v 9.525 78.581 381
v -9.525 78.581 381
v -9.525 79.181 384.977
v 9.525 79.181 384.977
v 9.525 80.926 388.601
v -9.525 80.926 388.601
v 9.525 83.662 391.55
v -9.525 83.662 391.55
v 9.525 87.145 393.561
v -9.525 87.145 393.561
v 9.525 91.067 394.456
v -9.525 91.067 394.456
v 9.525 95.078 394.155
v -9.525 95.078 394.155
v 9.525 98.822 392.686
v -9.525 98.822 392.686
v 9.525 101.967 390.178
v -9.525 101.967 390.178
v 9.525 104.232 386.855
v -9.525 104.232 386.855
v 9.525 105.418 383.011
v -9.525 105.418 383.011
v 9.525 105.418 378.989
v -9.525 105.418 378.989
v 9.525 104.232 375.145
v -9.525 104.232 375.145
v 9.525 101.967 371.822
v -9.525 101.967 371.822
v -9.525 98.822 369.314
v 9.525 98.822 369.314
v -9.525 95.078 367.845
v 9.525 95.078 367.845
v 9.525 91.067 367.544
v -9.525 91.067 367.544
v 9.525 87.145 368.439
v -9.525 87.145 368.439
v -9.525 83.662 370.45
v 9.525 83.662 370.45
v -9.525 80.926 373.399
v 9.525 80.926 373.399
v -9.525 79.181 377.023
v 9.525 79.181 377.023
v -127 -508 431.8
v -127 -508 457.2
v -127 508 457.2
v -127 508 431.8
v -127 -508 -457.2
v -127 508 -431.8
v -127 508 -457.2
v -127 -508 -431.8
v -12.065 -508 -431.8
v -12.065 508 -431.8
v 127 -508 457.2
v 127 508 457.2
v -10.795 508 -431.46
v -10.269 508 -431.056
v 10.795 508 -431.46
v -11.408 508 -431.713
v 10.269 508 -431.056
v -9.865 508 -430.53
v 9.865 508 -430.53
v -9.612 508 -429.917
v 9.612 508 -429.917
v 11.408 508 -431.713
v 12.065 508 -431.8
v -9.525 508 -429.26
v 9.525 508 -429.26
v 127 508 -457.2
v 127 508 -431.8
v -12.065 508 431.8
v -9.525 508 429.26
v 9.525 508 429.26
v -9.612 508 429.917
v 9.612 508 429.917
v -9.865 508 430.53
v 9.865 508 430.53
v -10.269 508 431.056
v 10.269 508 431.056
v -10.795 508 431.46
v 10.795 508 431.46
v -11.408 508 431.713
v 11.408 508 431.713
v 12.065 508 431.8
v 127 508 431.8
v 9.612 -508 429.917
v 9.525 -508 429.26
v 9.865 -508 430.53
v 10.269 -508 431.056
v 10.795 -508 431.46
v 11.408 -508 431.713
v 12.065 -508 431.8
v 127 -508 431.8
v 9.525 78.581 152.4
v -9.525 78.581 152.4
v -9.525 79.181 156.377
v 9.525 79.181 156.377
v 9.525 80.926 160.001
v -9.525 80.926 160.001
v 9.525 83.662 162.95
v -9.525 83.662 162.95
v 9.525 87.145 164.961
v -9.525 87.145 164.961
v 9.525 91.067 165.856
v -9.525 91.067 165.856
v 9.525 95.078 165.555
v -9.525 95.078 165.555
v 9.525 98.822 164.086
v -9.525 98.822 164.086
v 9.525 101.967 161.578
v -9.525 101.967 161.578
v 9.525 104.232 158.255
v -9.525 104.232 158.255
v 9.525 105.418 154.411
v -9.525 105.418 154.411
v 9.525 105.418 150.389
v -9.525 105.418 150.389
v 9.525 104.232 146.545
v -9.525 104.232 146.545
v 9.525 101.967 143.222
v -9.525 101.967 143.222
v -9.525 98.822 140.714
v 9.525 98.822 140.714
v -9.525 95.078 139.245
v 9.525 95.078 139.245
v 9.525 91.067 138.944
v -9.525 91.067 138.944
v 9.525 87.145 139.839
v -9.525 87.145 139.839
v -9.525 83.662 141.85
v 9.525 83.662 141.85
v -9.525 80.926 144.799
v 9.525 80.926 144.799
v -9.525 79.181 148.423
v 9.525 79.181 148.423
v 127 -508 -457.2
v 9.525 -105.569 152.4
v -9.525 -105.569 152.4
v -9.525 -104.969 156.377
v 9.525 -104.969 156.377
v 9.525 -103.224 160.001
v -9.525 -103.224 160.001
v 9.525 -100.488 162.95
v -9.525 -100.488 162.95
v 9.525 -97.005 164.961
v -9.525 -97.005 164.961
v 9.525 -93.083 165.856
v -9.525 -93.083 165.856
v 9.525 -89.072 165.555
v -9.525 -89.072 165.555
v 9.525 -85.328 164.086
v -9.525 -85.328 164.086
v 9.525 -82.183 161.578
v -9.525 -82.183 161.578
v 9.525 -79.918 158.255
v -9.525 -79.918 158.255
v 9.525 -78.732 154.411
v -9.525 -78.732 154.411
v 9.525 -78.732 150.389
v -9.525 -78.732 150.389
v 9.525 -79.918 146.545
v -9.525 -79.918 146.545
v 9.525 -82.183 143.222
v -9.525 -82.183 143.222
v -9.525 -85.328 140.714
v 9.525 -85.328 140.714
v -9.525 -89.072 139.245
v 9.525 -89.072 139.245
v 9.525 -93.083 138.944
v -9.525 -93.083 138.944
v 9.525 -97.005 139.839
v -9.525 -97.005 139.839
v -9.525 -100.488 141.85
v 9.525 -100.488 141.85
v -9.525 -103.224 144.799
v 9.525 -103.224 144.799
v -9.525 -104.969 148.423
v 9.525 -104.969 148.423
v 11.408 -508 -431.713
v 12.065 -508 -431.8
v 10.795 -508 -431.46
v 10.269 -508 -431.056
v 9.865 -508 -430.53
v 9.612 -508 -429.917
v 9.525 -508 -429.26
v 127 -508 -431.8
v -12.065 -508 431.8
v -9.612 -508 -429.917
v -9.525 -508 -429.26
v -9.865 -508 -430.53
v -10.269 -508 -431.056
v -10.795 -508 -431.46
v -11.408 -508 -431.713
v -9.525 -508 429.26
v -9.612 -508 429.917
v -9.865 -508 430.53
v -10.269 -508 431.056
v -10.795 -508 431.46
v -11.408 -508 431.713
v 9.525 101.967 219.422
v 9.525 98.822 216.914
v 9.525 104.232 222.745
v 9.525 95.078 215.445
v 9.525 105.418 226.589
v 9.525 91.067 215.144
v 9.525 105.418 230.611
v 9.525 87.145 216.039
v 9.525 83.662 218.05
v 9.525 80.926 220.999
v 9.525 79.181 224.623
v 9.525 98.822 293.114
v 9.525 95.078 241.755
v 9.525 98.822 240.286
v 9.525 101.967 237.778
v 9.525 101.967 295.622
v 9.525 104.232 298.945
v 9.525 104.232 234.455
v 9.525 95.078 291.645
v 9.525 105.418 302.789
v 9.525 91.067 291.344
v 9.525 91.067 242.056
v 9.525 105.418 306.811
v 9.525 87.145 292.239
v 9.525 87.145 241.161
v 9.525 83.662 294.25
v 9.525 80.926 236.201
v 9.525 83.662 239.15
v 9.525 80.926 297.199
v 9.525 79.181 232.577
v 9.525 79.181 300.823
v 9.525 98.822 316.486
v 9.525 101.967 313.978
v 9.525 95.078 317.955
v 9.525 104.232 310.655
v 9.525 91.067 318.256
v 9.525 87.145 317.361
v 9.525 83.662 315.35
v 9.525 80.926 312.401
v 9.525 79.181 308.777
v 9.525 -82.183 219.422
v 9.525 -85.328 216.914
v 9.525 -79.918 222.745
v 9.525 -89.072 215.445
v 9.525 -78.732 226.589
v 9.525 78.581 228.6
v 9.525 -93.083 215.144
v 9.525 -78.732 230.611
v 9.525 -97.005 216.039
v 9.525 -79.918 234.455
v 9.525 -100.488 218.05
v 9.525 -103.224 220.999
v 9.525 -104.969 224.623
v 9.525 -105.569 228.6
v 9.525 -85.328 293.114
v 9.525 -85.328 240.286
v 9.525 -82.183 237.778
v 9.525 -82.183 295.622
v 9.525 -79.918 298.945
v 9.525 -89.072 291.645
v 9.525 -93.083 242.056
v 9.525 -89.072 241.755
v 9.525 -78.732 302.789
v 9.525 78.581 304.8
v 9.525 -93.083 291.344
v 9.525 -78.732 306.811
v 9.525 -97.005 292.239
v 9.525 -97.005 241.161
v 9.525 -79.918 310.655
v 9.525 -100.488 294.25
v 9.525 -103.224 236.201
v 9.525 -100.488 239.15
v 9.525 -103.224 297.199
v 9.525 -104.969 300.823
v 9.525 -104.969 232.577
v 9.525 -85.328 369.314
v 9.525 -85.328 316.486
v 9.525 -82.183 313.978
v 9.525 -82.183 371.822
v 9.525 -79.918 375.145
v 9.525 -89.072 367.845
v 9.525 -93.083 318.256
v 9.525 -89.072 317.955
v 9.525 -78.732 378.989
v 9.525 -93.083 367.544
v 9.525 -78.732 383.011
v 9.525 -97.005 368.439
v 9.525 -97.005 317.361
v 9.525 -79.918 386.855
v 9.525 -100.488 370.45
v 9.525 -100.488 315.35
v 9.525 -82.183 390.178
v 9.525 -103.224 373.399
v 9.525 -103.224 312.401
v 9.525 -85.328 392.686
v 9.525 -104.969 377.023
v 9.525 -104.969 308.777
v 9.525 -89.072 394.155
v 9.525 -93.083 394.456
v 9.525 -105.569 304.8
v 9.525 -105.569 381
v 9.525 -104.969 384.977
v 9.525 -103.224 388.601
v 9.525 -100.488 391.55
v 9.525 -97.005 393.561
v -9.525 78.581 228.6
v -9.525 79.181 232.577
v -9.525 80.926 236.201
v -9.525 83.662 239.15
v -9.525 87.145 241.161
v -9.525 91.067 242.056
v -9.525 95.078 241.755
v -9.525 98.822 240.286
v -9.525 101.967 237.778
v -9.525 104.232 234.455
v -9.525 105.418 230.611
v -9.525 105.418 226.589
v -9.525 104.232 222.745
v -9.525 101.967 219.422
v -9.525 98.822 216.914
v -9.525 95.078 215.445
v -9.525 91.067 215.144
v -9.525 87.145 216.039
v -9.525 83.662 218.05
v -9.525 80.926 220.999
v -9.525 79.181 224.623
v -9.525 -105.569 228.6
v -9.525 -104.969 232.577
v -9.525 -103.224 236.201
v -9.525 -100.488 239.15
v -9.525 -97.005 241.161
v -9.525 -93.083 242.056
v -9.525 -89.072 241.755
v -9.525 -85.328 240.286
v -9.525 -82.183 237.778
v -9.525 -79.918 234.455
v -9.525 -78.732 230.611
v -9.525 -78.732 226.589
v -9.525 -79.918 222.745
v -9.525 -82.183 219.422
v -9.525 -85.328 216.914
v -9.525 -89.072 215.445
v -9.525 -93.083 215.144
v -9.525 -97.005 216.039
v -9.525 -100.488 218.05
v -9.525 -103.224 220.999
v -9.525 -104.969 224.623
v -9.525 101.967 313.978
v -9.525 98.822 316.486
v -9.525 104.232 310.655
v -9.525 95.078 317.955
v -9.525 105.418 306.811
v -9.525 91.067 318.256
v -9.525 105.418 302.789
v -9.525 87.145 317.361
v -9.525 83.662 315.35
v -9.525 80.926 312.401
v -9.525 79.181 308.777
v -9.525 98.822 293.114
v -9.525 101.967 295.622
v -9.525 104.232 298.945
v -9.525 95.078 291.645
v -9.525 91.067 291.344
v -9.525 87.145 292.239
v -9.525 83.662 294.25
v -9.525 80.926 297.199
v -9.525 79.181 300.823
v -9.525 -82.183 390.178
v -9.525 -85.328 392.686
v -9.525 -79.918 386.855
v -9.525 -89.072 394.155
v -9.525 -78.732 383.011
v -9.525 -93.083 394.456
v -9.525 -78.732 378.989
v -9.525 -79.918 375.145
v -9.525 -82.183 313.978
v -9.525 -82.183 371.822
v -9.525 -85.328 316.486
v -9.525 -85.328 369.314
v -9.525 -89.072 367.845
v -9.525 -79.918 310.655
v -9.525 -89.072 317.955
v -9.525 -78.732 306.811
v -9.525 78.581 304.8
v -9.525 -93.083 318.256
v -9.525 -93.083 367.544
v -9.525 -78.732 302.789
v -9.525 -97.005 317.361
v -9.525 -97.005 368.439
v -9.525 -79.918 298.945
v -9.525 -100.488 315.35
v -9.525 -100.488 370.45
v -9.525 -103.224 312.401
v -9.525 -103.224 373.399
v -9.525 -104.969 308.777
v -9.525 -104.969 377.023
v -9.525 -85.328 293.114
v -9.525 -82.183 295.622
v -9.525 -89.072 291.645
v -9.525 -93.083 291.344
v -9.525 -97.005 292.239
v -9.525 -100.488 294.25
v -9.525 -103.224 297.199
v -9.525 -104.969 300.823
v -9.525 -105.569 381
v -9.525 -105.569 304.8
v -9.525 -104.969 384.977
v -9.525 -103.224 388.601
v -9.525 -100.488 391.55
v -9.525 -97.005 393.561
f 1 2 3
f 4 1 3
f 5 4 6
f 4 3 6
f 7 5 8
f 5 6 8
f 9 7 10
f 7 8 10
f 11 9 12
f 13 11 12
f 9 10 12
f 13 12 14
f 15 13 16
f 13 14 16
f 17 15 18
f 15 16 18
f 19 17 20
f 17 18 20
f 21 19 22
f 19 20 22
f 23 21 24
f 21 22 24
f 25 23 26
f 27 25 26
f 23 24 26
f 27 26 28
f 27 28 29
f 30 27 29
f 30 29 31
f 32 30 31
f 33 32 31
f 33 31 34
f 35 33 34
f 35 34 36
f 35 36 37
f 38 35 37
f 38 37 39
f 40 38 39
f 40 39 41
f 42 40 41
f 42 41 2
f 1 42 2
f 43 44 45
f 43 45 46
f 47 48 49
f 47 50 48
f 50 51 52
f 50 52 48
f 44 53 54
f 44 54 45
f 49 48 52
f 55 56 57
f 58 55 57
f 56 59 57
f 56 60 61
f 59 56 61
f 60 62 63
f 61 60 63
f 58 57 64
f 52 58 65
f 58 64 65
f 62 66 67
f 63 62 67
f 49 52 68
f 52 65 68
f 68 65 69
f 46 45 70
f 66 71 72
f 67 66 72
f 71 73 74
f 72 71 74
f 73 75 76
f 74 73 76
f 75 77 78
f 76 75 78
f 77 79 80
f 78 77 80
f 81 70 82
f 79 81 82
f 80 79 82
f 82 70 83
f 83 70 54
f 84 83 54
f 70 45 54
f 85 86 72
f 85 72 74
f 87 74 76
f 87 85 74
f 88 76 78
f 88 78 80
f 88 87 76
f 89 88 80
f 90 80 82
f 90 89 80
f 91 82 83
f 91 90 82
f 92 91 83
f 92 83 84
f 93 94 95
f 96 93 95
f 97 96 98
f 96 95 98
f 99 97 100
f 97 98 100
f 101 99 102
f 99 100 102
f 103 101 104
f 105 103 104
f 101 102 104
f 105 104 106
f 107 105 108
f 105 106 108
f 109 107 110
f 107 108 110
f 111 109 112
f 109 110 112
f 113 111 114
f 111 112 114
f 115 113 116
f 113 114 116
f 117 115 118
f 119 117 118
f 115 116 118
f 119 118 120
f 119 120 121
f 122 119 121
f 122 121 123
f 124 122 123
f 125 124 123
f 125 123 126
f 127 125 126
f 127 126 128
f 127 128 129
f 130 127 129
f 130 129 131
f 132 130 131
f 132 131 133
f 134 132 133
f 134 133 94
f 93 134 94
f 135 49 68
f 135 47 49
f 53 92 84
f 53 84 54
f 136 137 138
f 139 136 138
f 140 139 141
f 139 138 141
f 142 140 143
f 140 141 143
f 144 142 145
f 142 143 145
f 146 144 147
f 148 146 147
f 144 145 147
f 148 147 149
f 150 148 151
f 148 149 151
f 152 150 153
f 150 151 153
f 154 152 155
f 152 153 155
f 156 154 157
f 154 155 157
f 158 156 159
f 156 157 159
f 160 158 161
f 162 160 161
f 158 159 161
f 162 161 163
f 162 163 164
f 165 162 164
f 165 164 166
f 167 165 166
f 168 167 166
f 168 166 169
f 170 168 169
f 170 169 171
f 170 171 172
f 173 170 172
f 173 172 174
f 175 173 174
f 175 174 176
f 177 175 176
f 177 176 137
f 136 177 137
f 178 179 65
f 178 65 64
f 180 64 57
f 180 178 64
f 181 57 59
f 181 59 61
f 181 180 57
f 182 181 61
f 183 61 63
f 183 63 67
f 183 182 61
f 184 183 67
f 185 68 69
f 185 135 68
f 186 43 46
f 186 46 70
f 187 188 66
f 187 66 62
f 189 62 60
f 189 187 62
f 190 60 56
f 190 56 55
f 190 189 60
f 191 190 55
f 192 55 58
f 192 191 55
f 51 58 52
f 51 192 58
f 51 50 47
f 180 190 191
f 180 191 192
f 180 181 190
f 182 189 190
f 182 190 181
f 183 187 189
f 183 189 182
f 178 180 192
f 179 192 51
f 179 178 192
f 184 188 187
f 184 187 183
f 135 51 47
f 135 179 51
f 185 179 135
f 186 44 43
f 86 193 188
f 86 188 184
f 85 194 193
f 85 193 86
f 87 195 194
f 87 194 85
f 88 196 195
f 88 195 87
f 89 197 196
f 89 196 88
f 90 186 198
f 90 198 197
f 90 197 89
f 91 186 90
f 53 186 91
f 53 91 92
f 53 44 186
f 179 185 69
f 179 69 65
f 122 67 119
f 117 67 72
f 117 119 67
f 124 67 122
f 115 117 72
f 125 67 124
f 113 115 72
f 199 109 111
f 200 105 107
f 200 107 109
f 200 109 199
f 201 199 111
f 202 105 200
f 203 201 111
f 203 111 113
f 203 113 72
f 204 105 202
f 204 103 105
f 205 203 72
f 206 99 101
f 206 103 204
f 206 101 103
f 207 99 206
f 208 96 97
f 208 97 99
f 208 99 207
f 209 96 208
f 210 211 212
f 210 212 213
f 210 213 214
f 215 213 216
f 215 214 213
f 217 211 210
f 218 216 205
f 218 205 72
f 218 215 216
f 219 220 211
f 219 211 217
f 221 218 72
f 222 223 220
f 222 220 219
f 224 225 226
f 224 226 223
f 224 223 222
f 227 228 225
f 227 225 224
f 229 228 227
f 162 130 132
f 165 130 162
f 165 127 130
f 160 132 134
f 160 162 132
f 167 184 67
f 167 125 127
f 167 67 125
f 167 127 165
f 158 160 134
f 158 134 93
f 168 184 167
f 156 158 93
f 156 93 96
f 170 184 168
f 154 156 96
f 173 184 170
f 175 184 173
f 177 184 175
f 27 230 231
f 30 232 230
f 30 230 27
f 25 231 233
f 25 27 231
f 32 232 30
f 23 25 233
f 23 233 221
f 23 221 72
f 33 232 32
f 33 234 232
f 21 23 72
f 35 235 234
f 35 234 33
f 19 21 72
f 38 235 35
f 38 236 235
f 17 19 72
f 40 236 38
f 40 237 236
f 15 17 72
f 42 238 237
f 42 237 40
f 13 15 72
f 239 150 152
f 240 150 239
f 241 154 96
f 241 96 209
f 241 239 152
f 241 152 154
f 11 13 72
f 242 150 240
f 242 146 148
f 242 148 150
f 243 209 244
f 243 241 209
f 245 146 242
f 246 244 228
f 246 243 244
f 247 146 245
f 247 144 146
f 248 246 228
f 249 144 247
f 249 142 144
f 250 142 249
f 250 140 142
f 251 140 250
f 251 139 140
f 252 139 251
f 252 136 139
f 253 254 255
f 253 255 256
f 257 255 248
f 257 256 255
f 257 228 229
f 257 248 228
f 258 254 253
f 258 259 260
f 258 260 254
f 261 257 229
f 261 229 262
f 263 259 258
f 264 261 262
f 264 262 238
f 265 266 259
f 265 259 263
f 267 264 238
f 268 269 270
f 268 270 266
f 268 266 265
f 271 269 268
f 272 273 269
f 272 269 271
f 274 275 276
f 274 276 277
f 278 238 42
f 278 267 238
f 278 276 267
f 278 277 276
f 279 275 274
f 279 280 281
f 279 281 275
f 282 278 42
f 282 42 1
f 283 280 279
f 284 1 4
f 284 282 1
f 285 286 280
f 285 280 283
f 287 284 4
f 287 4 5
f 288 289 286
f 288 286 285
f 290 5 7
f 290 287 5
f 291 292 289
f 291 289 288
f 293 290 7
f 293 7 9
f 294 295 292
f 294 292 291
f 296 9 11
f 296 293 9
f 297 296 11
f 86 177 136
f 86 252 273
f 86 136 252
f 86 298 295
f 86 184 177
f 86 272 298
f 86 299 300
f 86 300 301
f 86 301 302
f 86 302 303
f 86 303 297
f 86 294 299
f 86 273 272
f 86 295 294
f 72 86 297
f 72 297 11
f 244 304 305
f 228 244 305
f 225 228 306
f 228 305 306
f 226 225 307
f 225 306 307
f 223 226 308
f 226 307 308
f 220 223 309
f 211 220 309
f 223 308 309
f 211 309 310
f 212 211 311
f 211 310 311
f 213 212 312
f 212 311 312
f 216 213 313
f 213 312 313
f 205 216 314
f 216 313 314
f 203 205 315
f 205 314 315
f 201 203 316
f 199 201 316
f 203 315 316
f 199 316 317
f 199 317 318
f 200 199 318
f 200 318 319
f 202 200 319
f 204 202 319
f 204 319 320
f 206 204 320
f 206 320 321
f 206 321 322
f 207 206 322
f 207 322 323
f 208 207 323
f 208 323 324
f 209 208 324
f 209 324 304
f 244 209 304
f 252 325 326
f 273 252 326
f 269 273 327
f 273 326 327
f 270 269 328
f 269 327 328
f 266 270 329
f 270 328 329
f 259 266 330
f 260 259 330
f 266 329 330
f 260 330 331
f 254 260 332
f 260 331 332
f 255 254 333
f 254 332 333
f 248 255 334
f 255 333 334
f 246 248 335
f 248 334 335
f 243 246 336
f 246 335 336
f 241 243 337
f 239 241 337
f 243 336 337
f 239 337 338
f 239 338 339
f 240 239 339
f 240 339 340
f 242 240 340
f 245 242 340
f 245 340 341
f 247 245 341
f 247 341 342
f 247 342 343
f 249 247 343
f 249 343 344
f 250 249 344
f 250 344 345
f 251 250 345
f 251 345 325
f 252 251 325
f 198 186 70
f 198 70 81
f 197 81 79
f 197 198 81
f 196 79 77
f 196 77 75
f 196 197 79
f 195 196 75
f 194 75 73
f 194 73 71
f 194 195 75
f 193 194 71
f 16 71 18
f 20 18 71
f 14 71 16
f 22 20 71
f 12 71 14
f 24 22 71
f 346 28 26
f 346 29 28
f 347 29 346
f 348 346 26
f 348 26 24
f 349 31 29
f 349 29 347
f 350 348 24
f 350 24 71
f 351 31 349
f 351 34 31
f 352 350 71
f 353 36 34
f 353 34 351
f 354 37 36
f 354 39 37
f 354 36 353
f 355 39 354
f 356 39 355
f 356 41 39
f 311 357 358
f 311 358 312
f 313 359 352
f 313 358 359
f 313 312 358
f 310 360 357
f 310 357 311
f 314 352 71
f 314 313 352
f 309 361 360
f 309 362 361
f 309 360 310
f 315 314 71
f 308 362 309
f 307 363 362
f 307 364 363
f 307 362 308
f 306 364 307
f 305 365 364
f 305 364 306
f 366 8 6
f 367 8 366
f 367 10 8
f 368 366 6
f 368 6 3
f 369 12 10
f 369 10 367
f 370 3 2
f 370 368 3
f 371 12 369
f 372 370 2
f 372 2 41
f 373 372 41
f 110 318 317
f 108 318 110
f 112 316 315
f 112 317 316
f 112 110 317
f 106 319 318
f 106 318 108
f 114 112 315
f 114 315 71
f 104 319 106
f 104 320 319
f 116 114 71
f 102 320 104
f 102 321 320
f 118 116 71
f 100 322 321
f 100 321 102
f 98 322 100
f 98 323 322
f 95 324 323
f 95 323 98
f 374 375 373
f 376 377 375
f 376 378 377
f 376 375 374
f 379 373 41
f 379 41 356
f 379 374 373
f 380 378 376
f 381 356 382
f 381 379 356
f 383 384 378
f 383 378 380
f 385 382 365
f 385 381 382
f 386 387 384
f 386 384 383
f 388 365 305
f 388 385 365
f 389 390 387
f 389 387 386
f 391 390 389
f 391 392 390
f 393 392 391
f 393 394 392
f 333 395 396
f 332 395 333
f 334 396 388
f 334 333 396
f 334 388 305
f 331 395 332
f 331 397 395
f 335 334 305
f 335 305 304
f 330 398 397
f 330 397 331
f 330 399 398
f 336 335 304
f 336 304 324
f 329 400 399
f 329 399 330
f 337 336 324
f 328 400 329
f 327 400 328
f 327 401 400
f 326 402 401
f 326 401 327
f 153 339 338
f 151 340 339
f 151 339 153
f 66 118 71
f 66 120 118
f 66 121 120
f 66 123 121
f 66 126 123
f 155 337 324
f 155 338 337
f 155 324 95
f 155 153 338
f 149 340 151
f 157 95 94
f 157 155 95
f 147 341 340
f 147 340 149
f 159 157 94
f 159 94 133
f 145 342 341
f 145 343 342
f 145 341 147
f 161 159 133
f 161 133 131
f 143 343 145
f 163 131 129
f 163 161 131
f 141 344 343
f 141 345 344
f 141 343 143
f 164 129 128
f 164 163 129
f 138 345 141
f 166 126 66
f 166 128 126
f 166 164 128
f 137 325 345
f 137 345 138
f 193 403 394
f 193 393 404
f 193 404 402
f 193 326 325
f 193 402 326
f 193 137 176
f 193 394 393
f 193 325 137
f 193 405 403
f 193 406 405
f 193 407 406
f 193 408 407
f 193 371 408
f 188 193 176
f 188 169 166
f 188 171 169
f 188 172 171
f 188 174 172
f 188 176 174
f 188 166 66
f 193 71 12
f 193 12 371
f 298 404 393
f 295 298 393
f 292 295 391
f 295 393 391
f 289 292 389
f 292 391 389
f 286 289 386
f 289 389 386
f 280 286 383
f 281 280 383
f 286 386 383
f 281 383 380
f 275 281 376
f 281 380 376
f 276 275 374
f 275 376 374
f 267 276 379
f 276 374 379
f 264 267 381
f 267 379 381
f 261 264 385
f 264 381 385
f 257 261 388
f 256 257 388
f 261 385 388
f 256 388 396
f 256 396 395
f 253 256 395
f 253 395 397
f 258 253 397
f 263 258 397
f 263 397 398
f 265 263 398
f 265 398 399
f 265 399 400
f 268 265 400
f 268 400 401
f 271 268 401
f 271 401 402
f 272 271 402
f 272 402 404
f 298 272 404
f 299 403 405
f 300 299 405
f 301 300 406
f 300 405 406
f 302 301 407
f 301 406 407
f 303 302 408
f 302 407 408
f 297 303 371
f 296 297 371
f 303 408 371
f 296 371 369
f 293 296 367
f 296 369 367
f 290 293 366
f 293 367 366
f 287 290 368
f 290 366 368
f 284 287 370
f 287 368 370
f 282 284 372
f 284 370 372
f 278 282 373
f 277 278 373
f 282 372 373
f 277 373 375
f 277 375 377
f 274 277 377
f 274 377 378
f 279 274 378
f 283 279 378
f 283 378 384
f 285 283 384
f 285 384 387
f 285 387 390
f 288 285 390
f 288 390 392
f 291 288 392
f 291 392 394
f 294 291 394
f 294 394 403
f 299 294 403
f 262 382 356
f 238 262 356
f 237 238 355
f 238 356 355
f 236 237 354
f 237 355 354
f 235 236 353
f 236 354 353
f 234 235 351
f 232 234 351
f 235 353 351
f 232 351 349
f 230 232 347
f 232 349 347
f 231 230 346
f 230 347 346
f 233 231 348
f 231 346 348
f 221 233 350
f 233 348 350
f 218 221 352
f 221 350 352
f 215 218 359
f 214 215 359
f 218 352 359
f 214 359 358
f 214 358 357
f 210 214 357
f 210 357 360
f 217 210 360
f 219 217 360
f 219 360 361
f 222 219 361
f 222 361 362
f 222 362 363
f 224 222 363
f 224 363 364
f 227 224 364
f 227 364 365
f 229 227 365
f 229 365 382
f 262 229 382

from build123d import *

# Parameters (mm, degrees)
F1_DEPTH = 508
F3_D     = 26.9875
F3_DEPTH = 25.4
F4_D     = 26.9875
F4_DEPTH = 25.4


with BuildPart() as f1:
    # F0 (on Front) → F1 (new body, symmetric)
    with BuildSketch(Plane.XZ):
        with BuildLine():
            Line((127, -457.2), (127, -431.8))
            Line((127, -431.8), (12.065, -431.8))
            ThreePointArc((12.065, -431.8), (10.268949, -431.056051), (9.525, -429.26))
            Line((9.525, -429.26), (9.525, 429.26))
            ThreePointArc((9.525, 429.26), (10.268949, 431.056051), (12.065, 431.8))
            Line((12.065, 431.8), (127, 431.8))
            Line((127, 431.8), (127, 457.2))
            Line((127, 457.2), (-127, 457.2))
            Line((-127, 457.2), (-127, 431.8))
            Line((-127, 431.8), (-12.065, 431.8))
            ThreePointArc((-12.065, 431.8), (-10.268949, 431.056051), (-9.525, 429.26))
            Line((-9.525, 429.26), (-9.525, -429.26))
            ThreePointArc((-9.525, -429.26), (-10.268949, -431.056051), (-12.065, -431.8))
            Line((-12.065, -431.8), (-127, -431.8))
            Line((-127, -431.8), (-127, -457.2))
            Line((-127, -457.2), (127, -457.2))
        make_face()
    extrude(amount=F1_DEPTH, both=True)

    # F3
    with Locations(Plane.YZ.offset(9.525)):
        with Locations((92.075, 381), (92.075, 304.8), (92.075, 228.6), (92.075, 152.4)):
            Hole(F3_D / 2, depth=F3_DEPTH)

    # F4
    with Locations(Plane.YZ.offset(9.525)):
        with Locations((-92.075, 381), (-92.075, 304.8), (-92.075, 228.6), (-92.075, 152.4)):
            Hole(F4_D / 2, depth=F4_DEPTH)


solid = f1.part
